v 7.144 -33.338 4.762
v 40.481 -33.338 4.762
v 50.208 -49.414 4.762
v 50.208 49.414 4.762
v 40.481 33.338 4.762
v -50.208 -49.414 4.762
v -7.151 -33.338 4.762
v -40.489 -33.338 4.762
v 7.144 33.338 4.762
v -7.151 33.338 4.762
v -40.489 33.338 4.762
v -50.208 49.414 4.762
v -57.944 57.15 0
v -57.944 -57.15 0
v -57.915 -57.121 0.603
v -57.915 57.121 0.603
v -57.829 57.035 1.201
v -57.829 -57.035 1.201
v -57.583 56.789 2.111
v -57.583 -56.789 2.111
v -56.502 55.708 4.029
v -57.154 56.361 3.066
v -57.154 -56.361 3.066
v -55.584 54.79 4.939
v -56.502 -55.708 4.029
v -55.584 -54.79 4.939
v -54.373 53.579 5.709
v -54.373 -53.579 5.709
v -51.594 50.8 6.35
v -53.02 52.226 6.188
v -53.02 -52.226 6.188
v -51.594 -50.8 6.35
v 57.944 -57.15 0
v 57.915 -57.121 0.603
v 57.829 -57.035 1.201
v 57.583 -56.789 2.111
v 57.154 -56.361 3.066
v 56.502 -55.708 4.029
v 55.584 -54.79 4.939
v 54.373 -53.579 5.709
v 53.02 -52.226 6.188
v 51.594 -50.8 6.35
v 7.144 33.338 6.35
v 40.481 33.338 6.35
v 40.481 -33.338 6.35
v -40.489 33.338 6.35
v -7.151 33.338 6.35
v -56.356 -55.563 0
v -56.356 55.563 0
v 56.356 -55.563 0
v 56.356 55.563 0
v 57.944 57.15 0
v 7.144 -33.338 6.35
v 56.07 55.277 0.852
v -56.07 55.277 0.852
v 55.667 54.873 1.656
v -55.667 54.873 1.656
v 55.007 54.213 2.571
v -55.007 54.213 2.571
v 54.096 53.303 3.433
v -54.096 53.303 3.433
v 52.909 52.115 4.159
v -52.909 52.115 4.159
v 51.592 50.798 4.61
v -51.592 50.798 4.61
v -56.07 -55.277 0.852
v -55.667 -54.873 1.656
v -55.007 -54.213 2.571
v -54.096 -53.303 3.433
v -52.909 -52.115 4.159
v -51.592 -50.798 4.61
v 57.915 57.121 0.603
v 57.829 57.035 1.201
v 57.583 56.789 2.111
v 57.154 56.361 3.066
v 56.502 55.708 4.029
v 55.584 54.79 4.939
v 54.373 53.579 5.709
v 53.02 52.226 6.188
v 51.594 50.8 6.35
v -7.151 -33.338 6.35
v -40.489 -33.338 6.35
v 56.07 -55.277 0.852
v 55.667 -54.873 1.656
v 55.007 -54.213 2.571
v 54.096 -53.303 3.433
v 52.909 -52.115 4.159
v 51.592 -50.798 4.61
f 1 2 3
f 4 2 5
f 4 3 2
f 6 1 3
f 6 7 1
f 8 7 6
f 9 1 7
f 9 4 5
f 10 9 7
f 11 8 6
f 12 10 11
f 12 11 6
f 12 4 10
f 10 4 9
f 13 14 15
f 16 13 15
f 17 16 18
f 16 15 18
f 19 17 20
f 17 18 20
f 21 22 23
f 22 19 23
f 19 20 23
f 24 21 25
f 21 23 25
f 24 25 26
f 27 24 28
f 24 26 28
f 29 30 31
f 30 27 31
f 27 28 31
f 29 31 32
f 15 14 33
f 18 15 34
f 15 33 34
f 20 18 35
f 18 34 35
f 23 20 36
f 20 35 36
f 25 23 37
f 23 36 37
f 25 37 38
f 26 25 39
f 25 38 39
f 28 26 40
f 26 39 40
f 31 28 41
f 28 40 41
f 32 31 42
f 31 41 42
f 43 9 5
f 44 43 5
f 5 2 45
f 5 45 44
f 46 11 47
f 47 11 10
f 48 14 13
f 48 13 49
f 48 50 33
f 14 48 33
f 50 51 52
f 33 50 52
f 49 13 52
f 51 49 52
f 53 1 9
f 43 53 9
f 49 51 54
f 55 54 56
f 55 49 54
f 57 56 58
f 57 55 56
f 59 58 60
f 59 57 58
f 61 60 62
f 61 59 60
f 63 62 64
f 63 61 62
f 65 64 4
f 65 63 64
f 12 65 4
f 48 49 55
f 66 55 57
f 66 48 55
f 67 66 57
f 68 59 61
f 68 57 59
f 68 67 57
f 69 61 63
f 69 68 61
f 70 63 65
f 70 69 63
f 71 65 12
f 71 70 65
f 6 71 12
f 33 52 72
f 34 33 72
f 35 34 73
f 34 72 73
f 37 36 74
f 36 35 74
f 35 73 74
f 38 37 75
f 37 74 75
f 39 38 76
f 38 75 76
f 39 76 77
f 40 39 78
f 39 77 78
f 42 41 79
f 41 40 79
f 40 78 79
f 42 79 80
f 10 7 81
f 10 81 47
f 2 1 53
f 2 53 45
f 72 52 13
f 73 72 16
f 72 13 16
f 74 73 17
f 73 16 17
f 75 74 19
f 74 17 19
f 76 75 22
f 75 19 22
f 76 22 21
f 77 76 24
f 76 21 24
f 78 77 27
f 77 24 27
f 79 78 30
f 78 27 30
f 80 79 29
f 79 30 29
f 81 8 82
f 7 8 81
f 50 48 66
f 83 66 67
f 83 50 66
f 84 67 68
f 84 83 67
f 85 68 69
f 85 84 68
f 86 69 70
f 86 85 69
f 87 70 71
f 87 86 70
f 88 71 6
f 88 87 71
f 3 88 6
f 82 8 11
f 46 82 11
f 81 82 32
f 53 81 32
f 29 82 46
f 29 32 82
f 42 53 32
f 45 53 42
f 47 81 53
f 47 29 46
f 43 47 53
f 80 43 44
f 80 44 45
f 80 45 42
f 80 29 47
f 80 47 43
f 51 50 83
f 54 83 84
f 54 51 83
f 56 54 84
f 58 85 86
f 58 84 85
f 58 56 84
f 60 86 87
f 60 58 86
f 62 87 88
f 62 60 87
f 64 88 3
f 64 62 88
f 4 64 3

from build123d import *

# Parameters (mm, degrees)
SKETCH1_W           = 115.8875
SKETCH1_H           = 114.3
SKETCH1_W_2         = 33.3375
SKETCH1_H_2         = 66.675
BOSS_EXTRUDE1_DEPTH = 6.35
SKETCH2_W           = 112.7125
SKETCH2_H           = 111.125
CUT_EXTRUDE1_DEPTH  = 4.7625
FILLET2_R           = 6.35


with BuildPart() as part:
    # Sketch1 → Boss-Extrude1 (new body)
    with BuildSketch(Plane.XY):
        Rectangle(SKETCH1_W, SKETCH1_H)
        with Locations((-23.820216951, 0)):
            Rectangle(SKETCH1_W_2, SKETCH1_H_2, mode=Mode.SUBTRACT)
        with Locations((23.8125, 0)):
            Rectangle(SKETCH1_W_2, SKETCH1_H_2, mode=Mode.SUBTRACT)
    extrude(amount=BOSS_EXTRUDE1_DEPTH)

    # Sketch2 → Cut-Extrude1 (cut)
    with BuildSketch(Plane(origin=(0, 0, 0), x_dir=(-1, 0, 0), z_dir=(0, 0, -1))):
        Rectangle(SKETCH2_W, SKETCH2_H)
    extrude(amount=-CUT_EXTRUDE1_DEPTH, mode=Mode.SUBTRACT)

    # Fillet2
    # the kernel refuses this fillet: 6.35 mm, written as the material it adds along each edge
    with BuildSketch(Plane(origin=(56.35625, -55.5625, 4.7625), x_dir=(0, 0, -1), z_dir=(-1, 0, 0)), Plane(origin=(-56.35625, 55.5625, 4.7625), x_dir=(0, 0, -1), z_dir=(1, 0, 0))) as fillet2_piece_1:
        with BuildLine():
            CenterArc((6.35, -6.148361062), FILLET2_R, 104.477512186, 75.522487814)
            Line((0, -6.148361062), (0, 0))
            Line((0, 0), (4.7625, 0))
        make_face()
    extrude(amount=112.7125)
    with BuildSketch(Plane(origin=(-56.35625, -55.5625, 4.7625), x_dir=(0, 0, -1), z_dir=(0, 1, 0)), Plane(origin=(56.35625, 55.5625, 4.7625), x_dir=(0, 0, -1), z_dir=(0, -1, 0))) as fillet2_piece_2:
        with BuildLine():
            CenterArc((6.35, -6.148361062), FILLET2_R, 104.477512186, 75.522487814)
            Line((0, -6.148361062), (0, 0))
            Line((0, 0), (4.7625, 0))
        make_face()
    extrude(amount=111.125)
    # the kernel refuses this fillet: 6.35 mm, written as the material it takes off along each edge
    with BuildSketch(Plane(origin=(-73.81875, 57.15, 6.35), x_dir=(0, 0, -1), z_dir=(1, 0, 0))) as fillet2_2_piece_1:
        with BuildLine():
            CenterArc((FILLET2_R, -FILLET2_R), FILLET2_R, 90, 90)
            Line((0, -FILLET2_R), (0, 0))
            Line((0, 0), (FILLET2_R, 0))
        make_face()
    extrude(amount=147.6375, mode=Mode.SUBTRACT)
    with BuildSketch(Plane(origin=(-57.94375, -73.025, 6.35), x_dir=(0, 0, -1), z_dir=(0, 1, 0)), Plane(origin=(57.94375, 73.025, 6.35), x_dir=(0, 0, -1), z_dir=(0, -1, 0))) as fillet2_2_piece_2:
        with BuildLine():
            CenterArc((FILLET2_R, -FILLET2_R), FILLET2_R, 90, 90)
            Line((0, -FILLET2_R), (0, 0))
            Line((0, 0), (FILLET2_R, 0))
        make_face()
    extrude(amount=146.05, mode=Mode.SUBTRACT)
    with BuildSketch(Plane(origin=(73.81875, -57.15, 6.35), x_dir=(0, 1, 0), z_dir=(-1, 0, 0))) as fillet2_2_piece_3:
        with BuildLine():
            CenterArc((FILLET2_R, FILLET2_R), FILLET2_R, 180, 90)
            Line((0, FILLET2_R), (0, 0))
            Line((0, 0), (FILLET2_R, 0))
        make_face()
    extrude(amount=147.6375, mode=Mode.SUBTRACT)


solid = part.part
